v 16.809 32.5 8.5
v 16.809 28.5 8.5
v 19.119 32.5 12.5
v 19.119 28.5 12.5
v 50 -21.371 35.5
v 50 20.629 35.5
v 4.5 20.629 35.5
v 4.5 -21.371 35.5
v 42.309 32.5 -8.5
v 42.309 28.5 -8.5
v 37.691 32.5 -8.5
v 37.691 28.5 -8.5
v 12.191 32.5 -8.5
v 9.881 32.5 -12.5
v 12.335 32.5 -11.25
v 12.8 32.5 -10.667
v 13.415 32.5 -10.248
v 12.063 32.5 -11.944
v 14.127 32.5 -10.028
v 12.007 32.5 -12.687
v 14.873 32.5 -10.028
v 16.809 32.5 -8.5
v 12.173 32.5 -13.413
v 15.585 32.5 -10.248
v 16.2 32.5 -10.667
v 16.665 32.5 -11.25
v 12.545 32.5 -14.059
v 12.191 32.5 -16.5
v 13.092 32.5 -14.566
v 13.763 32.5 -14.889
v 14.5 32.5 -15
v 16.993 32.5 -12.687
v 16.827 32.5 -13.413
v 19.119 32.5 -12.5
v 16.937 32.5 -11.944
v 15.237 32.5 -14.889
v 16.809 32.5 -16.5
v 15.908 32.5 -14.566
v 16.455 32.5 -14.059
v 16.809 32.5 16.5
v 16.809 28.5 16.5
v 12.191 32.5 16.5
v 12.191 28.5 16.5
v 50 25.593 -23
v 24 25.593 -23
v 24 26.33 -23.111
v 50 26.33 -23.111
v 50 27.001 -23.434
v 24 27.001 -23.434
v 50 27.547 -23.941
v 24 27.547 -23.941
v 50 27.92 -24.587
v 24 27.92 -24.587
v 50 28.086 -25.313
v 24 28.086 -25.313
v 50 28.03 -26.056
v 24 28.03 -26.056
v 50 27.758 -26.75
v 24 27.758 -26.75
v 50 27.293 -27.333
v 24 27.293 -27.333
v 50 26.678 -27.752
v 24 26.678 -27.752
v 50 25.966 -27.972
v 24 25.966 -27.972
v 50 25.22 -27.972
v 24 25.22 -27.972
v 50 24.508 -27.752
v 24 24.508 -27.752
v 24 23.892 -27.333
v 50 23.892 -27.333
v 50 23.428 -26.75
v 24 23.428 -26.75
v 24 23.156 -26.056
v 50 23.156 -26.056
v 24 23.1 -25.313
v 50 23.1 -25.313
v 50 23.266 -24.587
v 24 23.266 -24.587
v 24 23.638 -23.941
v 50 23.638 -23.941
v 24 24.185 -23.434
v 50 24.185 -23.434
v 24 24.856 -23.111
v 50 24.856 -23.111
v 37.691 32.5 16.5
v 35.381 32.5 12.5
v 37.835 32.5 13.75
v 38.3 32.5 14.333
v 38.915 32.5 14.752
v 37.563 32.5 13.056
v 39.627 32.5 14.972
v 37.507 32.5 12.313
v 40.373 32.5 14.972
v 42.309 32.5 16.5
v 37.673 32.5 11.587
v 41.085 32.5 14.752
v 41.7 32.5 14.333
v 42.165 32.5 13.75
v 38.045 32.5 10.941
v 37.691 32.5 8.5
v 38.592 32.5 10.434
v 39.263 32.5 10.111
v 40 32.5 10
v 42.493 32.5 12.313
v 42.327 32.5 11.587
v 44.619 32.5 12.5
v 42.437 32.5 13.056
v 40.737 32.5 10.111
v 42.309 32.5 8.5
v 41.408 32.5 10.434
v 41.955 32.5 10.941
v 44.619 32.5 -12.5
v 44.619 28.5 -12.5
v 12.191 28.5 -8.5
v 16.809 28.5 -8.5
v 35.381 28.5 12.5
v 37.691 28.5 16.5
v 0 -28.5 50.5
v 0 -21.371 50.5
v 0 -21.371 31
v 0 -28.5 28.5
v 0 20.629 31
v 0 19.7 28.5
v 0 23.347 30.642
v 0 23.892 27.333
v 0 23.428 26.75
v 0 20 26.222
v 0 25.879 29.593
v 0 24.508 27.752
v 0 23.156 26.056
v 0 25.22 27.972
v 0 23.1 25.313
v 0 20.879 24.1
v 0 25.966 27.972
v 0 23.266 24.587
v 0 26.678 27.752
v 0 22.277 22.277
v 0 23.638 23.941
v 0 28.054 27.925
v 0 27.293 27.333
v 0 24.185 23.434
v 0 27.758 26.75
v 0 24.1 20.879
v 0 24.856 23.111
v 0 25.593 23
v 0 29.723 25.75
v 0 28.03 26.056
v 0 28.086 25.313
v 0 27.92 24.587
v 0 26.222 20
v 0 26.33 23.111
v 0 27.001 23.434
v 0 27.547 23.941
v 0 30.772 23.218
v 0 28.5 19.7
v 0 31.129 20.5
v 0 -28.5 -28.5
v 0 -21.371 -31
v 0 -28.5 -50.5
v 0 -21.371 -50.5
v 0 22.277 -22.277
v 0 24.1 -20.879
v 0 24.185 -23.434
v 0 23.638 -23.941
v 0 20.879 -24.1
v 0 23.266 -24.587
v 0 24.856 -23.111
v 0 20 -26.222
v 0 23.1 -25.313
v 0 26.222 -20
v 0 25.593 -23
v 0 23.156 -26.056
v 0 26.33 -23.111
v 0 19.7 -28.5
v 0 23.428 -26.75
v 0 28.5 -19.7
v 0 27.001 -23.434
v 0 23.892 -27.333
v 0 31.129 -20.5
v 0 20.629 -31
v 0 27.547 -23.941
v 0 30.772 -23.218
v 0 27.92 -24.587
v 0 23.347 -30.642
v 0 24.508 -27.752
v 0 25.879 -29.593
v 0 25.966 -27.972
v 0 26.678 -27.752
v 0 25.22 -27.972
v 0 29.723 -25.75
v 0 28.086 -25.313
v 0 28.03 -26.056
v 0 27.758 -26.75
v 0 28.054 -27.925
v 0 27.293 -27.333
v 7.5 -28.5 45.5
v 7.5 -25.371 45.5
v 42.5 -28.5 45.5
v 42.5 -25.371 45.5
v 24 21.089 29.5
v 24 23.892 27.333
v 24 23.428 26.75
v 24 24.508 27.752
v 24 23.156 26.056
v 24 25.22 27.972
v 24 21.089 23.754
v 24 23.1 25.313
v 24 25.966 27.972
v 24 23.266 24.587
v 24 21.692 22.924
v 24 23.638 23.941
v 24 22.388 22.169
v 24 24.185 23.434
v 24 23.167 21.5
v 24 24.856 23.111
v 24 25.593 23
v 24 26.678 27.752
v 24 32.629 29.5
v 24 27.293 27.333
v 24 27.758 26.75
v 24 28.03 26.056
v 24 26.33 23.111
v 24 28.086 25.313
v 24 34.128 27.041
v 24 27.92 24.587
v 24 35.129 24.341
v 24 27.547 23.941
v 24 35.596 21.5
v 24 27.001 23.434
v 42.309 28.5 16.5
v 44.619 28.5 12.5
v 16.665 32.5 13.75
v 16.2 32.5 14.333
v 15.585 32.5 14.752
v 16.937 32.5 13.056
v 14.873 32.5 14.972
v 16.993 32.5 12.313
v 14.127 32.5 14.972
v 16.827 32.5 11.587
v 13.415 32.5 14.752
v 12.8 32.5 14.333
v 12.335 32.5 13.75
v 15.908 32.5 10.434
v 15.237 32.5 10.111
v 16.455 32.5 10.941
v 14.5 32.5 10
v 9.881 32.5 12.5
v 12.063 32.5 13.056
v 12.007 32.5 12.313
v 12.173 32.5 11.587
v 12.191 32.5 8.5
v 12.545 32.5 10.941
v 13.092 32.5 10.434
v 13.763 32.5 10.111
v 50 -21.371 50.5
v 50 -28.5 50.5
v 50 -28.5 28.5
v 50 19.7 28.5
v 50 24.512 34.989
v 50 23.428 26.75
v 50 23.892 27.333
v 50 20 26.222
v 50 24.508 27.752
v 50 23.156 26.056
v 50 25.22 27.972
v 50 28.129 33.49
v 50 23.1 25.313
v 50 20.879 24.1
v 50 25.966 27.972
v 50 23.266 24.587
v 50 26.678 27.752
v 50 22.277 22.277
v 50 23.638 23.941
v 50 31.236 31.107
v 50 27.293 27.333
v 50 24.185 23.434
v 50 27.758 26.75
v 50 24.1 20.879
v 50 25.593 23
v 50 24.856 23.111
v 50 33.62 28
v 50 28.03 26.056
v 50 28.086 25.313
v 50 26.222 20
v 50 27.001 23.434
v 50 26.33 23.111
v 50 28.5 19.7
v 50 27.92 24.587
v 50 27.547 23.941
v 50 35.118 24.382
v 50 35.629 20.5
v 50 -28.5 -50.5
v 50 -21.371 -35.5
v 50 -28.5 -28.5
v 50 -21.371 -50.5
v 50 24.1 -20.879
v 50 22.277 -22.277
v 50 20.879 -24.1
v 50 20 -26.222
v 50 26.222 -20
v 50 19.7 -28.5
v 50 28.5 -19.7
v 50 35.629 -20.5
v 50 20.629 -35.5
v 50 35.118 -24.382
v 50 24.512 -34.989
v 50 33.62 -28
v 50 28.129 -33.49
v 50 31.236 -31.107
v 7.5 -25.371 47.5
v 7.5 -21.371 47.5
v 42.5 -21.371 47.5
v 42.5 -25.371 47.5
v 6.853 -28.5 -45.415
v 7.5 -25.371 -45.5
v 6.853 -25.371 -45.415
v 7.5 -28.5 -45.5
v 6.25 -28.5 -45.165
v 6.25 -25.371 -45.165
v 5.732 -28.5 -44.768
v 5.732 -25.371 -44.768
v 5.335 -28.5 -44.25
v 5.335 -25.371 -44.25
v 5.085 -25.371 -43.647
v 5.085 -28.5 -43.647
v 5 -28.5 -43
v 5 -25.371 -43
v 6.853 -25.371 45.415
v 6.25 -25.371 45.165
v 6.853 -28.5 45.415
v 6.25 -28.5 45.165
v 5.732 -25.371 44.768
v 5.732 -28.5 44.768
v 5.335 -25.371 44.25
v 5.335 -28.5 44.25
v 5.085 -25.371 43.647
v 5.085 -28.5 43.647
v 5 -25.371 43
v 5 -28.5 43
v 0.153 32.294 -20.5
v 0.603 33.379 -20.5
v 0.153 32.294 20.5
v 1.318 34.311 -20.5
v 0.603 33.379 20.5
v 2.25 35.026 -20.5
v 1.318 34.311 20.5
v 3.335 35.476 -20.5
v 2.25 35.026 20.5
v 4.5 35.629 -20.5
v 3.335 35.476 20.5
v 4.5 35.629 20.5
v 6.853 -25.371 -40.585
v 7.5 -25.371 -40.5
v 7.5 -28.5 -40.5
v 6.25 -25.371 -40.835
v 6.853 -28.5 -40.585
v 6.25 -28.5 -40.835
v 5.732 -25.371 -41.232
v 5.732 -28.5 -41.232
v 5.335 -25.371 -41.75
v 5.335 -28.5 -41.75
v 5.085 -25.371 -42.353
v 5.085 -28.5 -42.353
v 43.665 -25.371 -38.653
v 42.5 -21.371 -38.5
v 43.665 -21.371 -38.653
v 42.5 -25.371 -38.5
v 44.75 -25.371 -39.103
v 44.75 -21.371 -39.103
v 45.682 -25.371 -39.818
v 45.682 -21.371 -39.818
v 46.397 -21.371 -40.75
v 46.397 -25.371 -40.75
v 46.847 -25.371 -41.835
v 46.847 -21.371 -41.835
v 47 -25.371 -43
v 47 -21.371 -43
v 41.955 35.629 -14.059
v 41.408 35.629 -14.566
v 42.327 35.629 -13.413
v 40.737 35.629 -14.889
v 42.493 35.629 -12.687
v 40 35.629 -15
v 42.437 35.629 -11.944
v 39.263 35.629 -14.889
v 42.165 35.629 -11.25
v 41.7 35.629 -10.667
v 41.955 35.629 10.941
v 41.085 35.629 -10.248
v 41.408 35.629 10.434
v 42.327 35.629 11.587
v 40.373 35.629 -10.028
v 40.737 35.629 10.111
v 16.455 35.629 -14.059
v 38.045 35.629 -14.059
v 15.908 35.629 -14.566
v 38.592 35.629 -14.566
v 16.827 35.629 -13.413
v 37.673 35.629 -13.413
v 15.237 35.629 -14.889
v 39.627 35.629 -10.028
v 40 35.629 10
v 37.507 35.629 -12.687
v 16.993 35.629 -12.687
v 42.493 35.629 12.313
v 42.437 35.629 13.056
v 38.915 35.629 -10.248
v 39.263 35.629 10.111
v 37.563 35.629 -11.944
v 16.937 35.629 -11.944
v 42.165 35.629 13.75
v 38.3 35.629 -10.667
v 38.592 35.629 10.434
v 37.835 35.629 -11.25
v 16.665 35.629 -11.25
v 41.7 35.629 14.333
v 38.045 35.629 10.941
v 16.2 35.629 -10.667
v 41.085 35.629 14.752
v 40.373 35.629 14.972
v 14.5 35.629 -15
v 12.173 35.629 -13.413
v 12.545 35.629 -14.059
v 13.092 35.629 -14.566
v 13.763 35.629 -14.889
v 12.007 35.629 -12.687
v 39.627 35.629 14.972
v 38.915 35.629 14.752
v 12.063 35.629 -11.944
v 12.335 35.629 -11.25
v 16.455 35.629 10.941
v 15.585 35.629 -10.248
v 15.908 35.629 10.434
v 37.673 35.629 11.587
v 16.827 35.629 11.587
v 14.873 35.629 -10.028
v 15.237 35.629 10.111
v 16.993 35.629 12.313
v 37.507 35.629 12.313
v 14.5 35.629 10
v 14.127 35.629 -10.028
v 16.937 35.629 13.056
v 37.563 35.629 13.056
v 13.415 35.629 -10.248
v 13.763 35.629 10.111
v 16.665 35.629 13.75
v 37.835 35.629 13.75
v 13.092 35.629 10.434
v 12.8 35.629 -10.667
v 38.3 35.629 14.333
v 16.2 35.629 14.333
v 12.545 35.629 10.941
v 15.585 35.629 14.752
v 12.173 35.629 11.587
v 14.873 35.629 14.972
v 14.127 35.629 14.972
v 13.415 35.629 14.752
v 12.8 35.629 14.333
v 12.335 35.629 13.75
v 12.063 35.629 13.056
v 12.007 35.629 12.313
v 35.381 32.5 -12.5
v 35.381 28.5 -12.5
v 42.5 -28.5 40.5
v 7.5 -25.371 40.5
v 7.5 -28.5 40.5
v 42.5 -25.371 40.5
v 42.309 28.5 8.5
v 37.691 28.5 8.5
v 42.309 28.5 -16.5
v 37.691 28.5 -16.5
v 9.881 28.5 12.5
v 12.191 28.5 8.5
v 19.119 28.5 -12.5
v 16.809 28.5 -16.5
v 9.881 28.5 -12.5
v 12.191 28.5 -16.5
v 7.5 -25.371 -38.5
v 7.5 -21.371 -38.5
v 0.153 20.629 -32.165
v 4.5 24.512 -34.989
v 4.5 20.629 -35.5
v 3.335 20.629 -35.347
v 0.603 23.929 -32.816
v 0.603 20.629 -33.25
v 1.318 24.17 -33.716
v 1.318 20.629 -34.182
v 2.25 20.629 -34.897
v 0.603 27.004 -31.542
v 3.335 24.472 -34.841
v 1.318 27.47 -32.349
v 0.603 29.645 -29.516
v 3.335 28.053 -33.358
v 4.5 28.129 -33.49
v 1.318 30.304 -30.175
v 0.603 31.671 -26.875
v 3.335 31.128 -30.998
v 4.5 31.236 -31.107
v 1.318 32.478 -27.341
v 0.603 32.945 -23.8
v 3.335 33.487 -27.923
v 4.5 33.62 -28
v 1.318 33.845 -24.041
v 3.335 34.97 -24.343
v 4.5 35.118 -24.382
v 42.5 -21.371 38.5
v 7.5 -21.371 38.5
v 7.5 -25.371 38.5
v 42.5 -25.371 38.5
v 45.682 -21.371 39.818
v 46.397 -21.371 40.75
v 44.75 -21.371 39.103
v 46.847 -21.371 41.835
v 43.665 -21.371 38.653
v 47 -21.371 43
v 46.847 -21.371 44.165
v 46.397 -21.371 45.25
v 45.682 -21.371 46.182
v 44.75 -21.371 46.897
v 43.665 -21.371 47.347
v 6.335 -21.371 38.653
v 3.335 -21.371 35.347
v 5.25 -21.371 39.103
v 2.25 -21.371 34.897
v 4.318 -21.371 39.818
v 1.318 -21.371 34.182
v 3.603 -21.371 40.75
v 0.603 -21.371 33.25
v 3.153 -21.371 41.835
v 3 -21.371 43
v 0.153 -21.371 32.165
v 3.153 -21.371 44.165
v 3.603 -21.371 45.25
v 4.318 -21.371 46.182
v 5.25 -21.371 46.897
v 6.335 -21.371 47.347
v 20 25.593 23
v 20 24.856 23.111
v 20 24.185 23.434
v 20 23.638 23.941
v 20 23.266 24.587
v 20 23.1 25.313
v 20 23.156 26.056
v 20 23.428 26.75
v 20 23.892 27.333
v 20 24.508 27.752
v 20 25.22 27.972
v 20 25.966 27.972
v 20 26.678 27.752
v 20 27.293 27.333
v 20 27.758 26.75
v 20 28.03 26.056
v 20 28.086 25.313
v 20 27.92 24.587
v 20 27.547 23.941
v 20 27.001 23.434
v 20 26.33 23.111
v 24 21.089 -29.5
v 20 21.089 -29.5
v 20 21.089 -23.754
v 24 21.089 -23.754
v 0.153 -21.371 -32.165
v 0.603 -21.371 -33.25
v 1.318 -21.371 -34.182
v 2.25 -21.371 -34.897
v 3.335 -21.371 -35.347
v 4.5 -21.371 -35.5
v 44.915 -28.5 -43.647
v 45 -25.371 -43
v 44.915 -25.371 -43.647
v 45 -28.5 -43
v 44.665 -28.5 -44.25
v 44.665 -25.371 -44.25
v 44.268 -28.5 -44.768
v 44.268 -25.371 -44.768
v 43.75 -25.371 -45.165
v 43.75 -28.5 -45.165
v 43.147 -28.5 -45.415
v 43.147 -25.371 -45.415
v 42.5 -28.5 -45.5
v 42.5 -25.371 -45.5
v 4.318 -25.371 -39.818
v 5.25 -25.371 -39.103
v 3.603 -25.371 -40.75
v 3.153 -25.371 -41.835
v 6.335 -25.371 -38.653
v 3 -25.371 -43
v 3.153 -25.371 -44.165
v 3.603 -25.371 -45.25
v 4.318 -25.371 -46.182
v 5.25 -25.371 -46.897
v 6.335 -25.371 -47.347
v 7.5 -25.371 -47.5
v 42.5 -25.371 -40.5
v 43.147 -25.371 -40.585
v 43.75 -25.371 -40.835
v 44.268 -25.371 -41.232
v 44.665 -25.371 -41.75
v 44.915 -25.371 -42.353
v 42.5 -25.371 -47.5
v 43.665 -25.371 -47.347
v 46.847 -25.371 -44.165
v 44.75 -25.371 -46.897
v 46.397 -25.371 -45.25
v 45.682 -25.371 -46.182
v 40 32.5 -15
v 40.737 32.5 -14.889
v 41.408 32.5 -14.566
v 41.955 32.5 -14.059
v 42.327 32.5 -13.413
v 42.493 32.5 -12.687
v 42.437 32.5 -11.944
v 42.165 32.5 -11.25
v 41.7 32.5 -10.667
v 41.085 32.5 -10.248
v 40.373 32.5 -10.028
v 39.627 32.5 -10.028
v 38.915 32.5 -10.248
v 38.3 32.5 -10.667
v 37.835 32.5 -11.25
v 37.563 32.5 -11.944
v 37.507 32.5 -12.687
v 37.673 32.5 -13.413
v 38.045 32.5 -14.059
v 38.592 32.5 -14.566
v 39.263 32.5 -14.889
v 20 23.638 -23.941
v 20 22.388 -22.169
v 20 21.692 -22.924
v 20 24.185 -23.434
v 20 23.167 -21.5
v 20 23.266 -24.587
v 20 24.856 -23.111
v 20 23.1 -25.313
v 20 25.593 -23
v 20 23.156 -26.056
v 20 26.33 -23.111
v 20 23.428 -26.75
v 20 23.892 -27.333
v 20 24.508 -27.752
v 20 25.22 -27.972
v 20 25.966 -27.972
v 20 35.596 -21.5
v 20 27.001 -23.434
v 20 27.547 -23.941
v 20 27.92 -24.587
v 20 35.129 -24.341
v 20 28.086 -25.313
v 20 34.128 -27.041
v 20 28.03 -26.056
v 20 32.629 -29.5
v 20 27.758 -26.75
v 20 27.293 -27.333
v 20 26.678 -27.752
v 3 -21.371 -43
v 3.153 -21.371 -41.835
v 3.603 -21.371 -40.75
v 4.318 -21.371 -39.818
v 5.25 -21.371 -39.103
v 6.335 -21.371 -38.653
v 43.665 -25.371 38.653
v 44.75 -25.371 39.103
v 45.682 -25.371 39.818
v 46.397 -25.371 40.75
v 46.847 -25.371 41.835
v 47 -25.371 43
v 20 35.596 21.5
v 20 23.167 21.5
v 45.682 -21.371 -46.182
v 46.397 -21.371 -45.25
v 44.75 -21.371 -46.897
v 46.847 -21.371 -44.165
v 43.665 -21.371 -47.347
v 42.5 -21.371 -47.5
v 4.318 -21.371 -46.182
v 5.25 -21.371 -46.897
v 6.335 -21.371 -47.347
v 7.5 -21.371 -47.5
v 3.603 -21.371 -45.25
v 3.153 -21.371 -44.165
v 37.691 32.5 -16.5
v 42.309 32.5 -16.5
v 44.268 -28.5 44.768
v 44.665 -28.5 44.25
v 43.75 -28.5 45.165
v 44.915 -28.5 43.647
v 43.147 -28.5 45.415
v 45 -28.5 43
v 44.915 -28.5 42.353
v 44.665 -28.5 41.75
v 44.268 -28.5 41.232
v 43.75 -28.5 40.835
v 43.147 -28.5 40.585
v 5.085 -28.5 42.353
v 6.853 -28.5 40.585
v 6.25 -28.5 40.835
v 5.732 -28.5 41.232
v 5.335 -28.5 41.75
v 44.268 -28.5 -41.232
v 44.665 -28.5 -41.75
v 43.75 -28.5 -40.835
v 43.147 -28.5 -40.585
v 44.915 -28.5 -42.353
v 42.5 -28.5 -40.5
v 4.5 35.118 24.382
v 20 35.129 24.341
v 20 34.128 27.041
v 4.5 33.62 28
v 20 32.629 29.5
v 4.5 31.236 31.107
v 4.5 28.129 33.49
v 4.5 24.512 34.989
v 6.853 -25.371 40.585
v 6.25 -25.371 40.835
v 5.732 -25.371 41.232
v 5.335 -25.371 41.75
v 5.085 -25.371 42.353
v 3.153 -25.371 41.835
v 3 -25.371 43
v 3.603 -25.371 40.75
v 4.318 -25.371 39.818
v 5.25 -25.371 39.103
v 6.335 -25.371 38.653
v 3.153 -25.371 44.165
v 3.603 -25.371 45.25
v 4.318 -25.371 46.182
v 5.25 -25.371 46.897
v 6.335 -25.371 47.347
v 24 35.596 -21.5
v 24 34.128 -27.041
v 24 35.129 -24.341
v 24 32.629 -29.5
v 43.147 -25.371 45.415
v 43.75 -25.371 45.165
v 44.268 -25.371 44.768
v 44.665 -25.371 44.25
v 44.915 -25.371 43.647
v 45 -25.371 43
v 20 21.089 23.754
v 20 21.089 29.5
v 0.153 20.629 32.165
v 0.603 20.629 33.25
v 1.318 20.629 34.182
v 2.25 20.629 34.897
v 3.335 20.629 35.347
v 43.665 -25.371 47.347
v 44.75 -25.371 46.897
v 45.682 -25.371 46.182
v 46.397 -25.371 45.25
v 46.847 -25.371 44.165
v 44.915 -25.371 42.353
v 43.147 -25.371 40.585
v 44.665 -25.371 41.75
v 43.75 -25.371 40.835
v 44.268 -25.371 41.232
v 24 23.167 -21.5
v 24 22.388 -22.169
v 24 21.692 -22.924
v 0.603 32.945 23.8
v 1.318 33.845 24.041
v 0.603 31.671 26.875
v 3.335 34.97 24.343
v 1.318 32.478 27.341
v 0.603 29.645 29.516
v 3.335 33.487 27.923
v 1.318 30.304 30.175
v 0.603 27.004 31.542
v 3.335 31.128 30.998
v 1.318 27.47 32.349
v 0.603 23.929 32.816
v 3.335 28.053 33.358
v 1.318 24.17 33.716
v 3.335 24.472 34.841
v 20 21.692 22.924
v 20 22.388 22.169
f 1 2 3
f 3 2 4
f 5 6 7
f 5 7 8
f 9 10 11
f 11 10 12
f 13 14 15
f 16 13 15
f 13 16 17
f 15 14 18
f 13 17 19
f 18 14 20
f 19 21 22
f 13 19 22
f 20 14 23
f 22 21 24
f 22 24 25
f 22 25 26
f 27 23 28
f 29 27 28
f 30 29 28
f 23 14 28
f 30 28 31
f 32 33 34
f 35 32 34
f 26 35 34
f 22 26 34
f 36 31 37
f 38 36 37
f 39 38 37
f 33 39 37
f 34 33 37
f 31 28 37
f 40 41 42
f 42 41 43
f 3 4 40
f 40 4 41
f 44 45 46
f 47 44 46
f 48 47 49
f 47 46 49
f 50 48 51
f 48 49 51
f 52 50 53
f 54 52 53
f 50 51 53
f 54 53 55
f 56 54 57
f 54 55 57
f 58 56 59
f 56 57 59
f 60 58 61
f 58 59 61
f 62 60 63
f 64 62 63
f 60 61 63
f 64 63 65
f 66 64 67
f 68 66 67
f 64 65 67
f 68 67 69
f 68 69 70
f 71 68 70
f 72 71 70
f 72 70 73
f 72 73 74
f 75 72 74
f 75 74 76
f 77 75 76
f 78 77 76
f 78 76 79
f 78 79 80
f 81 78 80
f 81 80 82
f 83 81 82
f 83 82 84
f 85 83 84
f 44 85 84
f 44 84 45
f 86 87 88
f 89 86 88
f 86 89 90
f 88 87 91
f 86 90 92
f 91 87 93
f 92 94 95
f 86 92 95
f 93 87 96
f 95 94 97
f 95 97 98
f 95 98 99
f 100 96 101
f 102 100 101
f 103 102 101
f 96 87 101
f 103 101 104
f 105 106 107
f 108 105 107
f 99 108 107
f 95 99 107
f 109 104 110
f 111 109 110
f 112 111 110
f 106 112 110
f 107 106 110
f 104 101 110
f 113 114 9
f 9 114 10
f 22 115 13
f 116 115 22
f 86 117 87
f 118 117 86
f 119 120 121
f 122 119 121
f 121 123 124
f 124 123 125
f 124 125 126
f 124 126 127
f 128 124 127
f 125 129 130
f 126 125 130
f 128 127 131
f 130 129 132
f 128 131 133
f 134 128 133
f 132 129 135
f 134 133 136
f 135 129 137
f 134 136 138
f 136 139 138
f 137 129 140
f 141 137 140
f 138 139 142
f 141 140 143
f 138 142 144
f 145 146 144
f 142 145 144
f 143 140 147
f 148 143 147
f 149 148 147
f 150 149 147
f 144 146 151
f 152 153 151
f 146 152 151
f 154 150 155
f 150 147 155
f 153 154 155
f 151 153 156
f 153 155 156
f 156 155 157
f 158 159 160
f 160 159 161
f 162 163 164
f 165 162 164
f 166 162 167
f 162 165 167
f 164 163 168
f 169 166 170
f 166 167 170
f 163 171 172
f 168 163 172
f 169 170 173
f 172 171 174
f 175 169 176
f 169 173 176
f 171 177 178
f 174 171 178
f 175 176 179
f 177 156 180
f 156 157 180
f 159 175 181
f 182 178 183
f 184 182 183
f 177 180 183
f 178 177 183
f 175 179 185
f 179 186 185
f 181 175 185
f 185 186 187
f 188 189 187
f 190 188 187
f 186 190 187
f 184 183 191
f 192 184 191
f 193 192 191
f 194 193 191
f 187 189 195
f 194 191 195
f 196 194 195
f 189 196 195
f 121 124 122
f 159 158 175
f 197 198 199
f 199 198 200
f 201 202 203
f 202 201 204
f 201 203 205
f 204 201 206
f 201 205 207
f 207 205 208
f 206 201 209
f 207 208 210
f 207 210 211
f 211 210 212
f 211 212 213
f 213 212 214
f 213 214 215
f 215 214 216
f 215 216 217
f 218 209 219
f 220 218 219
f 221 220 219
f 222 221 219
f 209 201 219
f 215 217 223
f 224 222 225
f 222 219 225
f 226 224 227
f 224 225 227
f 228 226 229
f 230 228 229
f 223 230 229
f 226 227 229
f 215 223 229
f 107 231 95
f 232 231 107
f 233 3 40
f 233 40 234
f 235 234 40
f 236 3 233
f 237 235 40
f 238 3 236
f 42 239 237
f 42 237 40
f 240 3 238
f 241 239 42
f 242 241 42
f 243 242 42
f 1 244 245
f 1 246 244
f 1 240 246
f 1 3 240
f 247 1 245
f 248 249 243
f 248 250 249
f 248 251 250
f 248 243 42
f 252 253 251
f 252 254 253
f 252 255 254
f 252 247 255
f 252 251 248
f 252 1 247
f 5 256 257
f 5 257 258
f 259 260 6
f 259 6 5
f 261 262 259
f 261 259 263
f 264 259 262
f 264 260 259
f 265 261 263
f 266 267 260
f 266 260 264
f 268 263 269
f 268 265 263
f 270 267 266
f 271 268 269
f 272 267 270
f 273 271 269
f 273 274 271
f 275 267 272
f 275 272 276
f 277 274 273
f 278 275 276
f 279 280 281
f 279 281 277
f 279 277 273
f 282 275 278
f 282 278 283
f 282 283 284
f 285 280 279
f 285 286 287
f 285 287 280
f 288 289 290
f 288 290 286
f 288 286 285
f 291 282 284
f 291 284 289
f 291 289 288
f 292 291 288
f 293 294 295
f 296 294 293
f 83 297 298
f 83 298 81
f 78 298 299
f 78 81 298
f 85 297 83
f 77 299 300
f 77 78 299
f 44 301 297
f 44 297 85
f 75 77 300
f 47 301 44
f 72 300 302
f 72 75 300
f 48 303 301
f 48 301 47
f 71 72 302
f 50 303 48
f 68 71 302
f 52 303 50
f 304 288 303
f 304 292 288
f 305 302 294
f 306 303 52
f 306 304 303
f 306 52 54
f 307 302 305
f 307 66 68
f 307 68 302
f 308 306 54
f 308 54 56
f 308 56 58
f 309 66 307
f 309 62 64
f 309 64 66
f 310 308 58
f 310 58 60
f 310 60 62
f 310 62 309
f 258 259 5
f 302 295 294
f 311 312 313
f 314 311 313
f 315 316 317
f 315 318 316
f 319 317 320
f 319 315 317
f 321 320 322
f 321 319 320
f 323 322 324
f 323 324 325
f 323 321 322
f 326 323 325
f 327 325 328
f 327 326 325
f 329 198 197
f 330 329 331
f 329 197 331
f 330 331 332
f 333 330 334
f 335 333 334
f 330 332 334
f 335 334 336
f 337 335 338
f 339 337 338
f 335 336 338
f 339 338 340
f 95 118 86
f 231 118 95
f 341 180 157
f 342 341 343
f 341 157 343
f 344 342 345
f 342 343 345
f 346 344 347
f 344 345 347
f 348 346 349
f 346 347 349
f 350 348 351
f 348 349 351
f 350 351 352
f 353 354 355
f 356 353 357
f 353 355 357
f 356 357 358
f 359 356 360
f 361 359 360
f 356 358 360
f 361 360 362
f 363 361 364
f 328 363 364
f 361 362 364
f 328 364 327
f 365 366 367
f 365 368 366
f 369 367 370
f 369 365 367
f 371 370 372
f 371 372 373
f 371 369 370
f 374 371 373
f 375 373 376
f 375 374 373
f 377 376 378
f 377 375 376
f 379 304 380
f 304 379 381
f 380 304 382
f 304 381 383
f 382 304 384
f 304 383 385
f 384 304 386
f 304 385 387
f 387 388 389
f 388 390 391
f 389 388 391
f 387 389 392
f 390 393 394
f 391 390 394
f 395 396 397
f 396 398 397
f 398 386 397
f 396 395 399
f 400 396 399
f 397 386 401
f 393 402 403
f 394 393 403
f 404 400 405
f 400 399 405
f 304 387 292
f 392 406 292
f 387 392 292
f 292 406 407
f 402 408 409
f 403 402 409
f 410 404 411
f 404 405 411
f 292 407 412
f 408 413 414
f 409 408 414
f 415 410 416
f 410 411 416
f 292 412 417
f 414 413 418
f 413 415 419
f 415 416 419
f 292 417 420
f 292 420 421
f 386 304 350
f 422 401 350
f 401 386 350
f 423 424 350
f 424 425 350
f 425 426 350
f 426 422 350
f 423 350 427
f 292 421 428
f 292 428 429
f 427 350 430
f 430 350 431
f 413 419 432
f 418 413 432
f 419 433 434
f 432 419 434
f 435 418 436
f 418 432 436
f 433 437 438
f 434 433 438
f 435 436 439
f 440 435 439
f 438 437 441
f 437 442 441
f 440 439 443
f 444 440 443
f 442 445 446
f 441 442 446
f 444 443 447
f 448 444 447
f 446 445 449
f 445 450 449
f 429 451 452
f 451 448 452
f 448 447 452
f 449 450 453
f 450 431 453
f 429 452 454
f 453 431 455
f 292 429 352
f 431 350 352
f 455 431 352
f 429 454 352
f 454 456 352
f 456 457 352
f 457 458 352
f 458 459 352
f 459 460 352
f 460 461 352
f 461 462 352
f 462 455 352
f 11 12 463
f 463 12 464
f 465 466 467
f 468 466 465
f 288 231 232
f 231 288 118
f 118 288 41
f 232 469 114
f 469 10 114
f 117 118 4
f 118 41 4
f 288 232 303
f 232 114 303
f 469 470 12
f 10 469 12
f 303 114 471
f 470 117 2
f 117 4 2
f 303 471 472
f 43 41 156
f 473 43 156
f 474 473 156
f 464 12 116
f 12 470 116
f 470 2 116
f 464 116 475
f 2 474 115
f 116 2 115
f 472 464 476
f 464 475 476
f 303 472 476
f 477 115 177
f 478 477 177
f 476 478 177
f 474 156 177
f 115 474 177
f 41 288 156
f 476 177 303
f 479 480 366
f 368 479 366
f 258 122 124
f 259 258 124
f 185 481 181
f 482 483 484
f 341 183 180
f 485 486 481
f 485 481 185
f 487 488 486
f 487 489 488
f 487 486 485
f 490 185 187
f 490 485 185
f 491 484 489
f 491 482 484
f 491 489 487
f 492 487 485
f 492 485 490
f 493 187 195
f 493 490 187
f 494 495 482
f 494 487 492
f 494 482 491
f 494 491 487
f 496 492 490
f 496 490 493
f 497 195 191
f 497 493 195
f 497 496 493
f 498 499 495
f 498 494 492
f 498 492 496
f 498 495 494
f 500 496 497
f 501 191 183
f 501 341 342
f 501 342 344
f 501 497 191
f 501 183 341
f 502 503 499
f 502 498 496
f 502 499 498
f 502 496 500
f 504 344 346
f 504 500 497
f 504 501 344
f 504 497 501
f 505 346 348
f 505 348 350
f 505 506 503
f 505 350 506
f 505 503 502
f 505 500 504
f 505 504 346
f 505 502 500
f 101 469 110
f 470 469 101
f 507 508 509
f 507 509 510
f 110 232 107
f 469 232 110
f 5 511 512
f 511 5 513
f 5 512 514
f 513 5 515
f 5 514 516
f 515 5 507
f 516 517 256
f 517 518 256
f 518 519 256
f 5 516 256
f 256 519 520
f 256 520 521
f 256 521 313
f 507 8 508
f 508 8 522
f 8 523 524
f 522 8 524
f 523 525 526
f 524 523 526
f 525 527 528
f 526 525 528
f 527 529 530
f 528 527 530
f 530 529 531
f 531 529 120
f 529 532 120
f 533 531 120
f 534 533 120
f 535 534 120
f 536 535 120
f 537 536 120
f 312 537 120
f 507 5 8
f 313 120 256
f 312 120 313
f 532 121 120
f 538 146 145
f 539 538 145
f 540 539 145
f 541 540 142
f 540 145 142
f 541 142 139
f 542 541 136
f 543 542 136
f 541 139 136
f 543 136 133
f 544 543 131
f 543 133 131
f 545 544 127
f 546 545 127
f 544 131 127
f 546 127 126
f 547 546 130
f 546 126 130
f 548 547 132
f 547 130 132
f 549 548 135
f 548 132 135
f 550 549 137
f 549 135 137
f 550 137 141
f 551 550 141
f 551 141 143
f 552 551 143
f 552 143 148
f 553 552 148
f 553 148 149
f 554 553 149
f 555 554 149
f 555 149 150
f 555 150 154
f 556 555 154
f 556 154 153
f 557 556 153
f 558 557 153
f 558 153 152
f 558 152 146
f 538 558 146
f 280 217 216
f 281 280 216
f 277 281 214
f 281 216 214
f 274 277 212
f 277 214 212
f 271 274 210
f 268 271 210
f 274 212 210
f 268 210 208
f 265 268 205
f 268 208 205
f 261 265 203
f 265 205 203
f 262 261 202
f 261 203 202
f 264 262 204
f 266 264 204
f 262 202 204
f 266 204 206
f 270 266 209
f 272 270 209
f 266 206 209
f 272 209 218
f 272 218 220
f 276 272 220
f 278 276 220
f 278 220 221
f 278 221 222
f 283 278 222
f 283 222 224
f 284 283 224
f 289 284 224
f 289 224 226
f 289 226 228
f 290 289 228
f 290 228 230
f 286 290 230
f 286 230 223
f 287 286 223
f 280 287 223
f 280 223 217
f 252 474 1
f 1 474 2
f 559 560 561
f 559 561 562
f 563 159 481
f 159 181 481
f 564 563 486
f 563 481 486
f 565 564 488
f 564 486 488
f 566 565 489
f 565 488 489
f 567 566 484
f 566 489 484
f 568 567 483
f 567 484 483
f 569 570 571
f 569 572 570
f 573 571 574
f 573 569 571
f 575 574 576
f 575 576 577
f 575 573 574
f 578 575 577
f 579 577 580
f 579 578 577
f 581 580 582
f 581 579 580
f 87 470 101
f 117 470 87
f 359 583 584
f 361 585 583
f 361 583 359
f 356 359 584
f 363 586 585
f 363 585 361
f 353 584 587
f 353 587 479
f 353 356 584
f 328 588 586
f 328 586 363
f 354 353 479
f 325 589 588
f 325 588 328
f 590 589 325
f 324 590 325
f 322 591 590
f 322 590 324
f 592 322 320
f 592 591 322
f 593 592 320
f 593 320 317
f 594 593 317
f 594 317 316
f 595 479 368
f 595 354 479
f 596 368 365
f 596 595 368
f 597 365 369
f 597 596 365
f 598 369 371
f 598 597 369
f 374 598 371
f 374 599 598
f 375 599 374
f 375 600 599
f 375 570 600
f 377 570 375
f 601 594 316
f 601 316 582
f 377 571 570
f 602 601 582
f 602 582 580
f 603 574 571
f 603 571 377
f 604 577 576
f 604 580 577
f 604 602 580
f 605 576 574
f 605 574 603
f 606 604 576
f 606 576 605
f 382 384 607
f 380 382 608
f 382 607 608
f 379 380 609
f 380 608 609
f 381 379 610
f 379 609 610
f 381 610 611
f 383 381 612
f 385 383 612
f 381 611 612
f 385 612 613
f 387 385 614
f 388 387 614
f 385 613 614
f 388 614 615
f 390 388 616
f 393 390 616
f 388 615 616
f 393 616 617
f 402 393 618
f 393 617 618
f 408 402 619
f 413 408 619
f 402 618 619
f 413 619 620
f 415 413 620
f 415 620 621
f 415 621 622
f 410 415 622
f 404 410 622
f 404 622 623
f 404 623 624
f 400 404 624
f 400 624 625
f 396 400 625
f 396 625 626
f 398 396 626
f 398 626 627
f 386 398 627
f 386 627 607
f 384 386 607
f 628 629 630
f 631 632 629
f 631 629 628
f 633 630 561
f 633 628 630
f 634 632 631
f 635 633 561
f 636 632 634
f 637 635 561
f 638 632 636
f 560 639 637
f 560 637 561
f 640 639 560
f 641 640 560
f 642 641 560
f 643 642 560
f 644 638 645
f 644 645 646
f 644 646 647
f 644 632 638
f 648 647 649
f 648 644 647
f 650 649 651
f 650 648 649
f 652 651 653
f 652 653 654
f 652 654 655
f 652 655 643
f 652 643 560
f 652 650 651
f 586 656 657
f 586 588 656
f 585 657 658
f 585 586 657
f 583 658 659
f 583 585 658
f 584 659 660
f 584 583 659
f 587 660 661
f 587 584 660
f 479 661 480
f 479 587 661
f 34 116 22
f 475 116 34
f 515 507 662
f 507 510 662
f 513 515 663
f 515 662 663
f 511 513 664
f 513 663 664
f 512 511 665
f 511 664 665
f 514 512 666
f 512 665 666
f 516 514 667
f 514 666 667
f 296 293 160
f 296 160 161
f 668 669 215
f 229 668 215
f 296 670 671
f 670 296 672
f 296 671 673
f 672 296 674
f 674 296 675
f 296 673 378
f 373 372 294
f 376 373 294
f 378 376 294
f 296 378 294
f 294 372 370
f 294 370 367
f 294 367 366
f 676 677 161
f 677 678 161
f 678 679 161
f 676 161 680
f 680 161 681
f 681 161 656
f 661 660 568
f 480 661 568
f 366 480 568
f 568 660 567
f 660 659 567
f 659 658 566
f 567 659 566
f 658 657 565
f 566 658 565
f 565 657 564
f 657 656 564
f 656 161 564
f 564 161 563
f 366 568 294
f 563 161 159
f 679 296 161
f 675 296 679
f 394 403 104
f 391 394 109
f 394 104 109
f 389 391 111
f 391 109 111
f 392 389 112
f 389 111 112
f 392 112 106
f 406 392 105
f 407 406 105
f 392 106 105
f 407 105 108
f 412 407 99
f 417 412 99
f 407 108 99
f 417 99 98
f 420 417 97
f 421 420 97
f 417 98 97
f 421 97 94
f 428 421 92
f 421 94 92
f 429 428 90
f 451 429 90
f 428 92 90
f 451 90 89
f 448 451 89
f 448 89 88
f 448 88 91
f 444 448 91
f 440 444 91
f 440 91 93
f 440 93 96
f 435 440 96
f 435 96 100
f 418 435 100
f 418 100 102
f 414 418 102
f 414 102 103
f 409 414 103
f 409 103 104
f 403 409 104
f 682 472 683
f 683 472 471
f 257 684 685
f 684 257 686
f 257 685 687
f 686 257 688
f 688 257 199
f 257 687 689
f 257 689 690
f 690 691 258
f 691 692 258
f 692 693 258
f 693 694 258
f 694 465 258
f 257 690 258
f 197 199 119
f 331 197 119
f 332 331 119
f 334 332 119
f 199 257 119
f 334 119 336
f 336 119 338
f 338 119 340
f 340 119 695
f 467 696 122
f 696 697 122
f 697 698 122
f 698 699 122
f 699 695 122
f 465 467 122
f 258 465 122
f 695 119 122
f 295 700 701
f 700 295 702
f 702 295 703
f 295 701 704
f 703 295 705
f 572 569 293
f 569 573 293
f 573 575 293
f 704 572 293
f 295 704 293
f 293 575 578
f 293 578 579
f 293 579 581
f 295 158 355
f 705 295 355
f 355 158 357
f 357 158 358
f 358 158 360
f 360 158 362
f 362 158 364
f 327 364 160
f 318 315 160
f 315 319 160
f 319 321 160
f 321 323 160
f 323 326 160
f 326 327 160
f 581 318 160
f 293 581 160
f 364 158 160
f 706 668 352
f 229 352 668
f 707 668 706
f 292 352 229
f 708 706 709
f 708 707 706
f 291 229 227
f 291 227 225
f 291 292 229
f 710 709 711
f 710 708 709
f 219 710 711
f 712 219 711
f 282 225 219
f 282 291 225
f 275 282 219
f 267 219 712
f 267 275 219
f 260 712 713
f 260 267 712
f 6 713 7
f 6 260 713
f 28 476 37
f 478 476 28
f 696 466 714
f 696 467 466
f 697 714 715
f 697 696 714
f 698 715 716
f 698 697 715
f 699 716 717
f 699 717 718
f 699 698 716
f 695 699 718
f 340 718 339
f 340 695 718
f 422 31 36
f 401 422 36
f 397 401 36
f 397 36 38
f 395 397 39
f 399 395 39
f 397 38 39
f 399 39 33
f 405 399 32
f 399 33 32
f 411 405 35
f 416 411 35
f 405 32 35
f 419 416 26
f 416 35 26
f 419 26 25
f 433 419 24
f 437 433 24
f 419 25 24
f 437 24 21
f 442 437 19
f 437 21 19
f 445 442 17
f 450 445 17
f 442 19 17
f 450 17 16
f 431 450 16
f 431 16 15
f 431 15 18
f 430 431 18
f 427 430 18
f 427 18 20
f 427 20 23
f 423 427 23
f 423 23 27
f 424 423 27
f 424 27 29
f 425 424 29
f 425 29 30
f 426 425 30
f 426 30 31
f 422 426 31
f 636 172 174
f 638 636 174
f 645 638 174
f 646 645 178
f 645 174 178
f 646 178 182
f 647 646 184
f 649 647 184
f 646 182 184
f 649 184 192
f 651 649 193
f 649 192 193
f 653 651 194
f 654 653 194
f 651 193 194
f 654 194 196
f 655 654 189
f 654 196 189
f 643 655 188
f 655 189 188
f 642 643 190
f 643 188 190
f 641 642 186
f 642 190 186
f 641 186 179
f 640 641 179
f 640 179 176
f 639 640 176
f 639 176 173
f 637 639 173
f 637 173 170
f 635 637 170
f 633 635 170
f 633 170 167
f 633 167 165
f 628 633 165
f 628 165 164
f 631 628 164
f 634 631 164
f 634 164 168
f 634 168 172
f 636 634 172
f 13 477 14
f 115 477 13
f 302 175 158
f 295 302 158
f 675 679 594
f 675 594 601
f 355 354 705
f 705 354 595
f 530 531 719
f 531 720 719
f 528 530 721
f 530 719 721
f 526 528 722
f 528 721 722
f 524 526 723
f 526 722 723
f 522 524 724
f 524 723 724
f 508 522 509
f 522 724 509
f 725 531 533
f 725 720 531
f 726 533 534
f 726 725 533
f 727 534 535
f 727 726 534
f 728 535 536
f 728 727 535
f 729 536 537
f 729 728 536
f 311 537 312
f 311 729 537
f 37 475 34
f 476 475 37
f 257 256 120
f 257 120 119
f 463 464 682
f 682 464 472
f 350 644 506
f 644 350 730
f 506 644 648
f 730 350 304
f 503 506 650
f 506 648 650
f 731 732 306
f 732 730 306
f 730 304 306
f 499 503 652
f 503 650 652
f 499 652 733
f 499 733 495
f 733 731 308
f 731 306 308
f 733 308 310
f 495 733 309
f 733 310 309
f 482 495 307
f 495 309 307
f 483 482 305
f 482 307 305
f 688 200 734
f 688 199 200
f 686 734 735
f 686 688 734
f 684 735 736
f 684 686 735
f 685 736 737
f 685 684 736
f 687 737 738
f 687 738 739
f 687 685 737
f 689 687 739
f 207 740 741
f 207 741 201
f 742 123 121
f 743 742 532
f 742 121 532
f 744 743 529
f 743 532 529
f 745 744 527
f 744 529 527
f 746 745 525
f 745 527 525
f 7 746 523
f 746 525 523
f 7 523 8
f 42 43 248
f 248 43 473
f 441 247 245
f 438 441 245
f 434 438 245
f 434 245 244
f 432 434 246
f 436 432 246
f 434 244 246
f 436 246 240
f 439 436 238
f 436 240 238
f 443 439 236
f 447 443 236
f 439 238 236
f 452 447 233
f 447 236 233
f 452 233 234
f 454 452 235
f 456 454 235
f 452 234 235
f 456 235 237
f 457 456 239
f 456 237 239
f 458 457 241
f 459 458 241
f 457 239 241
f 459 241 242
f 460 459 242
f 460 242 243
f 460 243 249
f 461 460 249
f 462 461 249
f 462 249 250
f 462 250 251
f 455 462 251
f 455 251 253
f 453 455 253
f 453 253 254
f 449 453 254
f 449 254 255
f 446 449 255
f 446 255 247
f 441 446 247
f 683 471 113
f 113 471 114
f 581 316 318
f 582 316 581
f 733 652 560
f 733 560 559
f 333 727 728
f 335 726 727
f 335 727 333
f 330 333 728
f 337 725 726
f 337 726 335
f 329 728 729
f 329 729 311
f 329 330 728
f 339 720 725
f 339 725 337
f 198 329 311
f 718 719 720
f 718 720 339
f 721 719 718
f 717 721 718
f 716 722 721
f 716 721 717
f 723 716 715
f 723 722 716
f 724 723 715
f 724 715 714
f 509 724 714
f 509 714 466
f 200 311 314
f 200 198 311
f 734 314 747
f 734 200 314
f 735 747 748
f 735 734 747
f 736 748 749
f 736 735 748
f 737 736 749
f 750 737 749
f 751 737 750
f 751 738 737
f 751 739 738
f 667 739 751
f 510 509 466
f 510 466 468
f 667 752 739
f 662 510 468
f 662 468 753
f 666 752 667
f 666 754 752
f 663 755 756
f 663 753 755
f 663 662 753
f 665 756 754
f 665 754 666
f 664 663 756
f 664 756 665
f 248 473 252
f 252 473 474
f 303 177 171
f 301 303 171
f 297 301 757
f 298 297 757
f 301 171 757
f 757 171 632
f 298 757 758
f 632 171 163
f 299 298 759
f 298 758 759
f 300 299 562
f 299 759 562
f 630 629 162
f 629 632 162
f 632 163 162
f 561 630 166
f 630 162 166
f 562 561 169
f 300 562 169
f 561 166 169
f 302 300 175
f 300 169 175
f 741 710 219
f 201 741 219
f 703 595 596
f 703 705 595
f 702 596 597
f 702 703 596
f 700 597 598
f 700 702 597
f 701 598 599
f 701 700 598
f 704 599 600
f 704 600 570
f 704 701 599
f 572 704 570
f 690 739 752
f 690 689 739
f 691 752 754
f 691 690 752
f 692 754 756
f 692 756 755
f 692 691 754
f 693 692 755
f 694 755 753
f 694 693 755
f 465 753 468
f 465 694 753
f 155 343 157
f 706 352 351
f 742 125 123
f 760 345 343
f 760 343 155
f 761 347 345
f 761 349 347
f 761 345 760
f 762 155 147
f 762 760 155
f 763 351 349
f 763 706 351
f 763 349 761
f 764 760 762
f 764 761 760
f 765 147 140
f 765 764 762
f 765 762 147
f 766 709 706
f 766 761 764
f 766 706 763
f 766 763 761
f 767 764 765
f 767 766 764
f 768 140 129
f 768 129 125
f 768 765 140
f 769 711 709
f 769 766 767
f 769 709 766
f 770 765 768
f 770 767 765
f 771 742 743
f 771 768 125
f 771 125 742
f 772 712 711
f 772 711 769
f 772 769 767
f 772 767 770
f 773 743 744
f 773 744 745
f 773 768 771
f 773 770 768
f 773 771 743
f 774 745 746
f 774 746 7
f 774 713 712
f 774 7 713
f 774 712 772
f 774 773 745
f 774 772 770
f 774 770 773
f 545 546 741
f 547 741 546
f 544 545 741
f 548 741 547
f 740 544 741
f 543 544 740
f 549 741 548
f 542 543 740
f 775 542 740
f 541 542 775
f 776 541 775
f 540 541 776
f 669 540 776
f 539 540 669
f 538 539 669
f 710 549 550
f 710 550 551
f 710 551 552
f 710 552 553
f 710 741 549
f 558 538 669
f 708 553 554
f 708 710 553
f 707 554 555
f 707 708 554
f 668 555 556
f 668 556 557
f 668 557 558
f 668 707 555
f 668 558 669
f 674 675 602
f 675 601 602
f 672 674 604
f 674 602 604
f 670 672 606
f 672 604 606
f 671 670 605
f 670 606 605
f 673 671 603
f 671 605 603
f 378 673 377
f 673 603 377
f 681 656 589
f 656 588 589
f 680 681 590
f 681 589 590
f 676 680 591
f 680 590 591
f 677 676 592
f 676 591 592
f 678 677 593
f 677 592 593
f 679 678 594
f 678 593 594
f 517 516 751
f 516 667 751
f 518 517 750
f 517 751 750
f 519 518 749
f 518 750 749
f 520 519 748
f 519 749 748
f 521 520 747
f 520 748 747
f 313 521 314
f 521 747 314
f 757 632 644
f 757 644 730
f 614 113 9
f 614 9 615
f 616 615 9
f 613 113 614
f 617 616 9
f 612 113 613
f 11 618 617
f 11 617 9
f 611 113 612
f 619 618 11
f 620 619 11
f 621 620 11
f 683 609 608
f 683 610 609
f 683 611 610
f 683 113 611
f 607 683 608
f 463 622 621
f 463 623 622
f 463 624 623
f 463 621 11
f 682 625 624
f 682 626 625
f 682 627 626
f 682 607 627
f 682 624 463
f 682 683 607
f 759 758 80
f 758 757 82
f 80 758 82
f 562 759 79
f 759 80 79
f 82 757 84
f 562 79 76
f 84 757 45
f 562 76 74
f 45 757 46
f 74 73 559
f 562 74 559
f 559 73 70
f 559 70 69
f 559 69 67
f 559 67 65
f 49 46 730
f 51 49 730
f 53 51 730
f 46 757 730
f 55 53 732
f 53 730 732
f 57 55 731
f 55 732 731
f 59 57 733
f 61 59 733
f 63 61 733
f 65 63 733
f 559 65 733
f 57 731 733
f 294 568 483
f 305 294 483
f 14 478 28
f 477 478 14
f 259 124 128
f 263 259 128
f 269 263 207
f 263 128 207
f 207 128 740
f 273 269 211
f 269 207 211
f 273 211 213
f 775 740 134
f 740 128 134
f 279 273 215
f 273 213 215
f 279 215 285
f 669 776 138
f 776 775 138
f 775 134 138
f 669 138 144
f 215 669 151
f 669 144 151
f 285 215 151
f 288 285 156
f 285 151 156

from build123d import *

# Parameters (mm, degrees)
BOSS_EXTRUDE1_DEPTH = 50
SKETCH2_R           = 2.5
CUT_EXTRUDE1_DEPTH  = 50
FILLET1_R           = 15
SKETCH3_W           = 4
SKETCH3_H           = 8
CUT_EXTRUDE2_DEPTH  = 14.54
SKETCH4_W           = 44
SKETCH4_H           = 9
CUT_EXTRUDE3_DEPTH  = 4
SKETCH5_W           = 40
SKETCH5_H           = 5
CUT_EXTRUDE4_DEPTH  = 94.654951818
FILLET2_R           = 2.5
FILLET3_R           = 4.5
FILLET4_R           = 4.5
CUT_EXTRUDE5_START  = -7.129335
SKETCH6_R           = 2.5
CUT_EXTRUDE5_DEPTH  = 4
SKETCH8_R           = 2.5
CUT_EXTRUDE6_DEPTH  = 92.100219539


with BuildPart() as part:
    # Sketch1 → Boss-Extrude1 (new body)
    with BuildSketch(Plane(origin=(0, 0, 0), x_dir=(0, 0, -1), z_dir=(1, 0, 0))):
        with BuildLine():
            Line((35.5, 35.62933491), (-35.5, 35.62933491))
            Line((-35.5, 35.62933491), (-35.5, -21.37066509))
            Line((-35.5, -21.37066509), (-50.5, -21.37066509))
            Line((-50.5, -21.37066509), (-50.5, -28.5))
            Line((-50.5, -28.5), (-28.5, -28.5))
            Line((-28.5, -28.5), (-28.5, 19.7))
            ThreePointArc((-28.5, 19.7), (-22.277460326, 22.277460326), (-19.7, 28.5))
            Line((-19.7, 28.5), (19.7, 28.5))
            ThreePointArc((19.7, 28.5), (22.277460326, 22.277460326), (28.5, 19.7))
            Line((28.5, 19.7), (28.5, -28.5))
            Line((28.5, -28.5), (50.5, -28.5))
            Line((50.5, -28.5), (50.5, -21.37066509))
            Line((50.5, -21.37066509), (35.5, -21.37066509))
            Line((35.5, -21.37066509), (35.5, 35.62933491))
        make_face()
    extrude(amount=BOSS_EXTRUDE1_DEPTH)

    # Sketch2 → Cut-Extrude1 (cut)
    with BuildSketch(Plane.ZY):
        with Locations((-25.5, 25.592902541)):
            Circle(SKETCH2_R)
        with Locations(Location((25.5, 25.592902541, 0), (0, 0, 180))):
            Circle(SKETCH2_R)
    extrude(amount=-CUT_EXTRUDE1_DEPTH, mode=Mode.SUBTRACT)

    # Fillet1
    fillet1_edges = [part.edges().sort_by_distance(p)[0] for p in [
        (25, 35.62933491, 35.5),
        (25, 35.62933491, -35.5),
    ]]
    fillet(fillet1_edges, radius=FILLET1_R)

    # Sketch3 → Cut-Extrude2 (cut)
    with BuildSketch(Plane(origin=(0, 35.62933491, 0), x_dir=(1, 0, 0), z_dir=(0, 1, 0))):
        with Locations((22, 25.5)):
            Rectangle(SKETCH3_W, SKETCH3_H)
        with Locations((22, -25.5)):
            Rectangle(SKETCH3_W, SKETCH3_H)
    extrude(amount=-CUT_EXTRUDE2_DEPTH, mode=Mode.SUBTRACT)

    # Sketch4 → Cut-Extrude3 (cut)
    with BuildSketch(Plane(origin=(0, -21.37066509, 0), x_dir=(1, 0, 0), z_dir=(0, 1, 0))):
        with Locations((25, -43)):
            Rectangle(SKETCH4_W, SKETCH4_H)
        with Locations((25, 43)):
            Rectangle(SKETCH4_W, SKETCH4_H)
    extrude(amount=-CUT_EXTRUDE3_DEPTH, mode=Mode.SUBTRACT)

    # Sketch5 → Cut-Extrude4 (cut, through all)
    with BuildSketch(Plane(origin=(0, -25.37066509, 0), x_dir=(1, 0, 0), z_dir=(0, 1, 0))):
        with Locations((25, -43)):
            Rectangle(SKETCH5_W, SKETCH5_H)
        with Locations((25, 43)):
            Rectangle(SKETCH5_W, SKETCH5_H)
    extrude(amount=-CUT_EXTRUDE4_DEPTH, mode=Mode.SUBTRACT)

    # Fillet2
    fillet2_edges = [part.edges().sort_by_distance(p)[0] for p in [
        (45, -26.935332545, 40.5),
        (45, -26.935332545, 45.5),
        (5, -26.935332545, 45.5),
        (5, -26.935332545, 40.5),
        (5, -26.935332545, -45.5),
        (5, -26.935332545, -40.5),
        (45, -26.935332545, -45.5),
        (45, -26.935332545, -40.5),
    ]]
    fillet(fillet2_edges, radius=FILLET2_R - 0.0001)  # a hair under: the kernel refuses the full size

    # Fillet3
    fillet3_edges = [part.edges().sort_by_distance(p)[0] for p in [
        (3, -23.37066509, 38.5),
        (3, -23.37066509, 47.5),
        (47, -23.37066509, 47.5),
        (47, -23.37066509, 38.5),
        (47, -23.37066509, -47.5),
        (47, -23.37066509, -38.5),
        (3, -23.37066509, -47.5),
        (3, -23.37066509, -38.5),
    ]]
    fillet(fillet3_edges, radius=FILLET3_R - 0.0001)  # a hair under: the kernel refuses the full size

    # Fillet4
    fillet4_edges = [part.edges().sort_by_distance(p)[0] for p in [
        (0, -0.37066509, -35.5),
        (0, -0.37066509, 35.5),
        (0, 35.62933491, 0),
        (0, 31.235936628, -31.106601718),
        (0, 31.235936628, 31.106601718),
    ]]
    fillet(fillet4_edges, radius=FILLET4_R)

    # Sketch6 → Cut-Extrude5 (cut)
    # profile 1 of 4: a face of its own
    with BuildSketch(Plane(origin=(0, 35.62933491, 0), x_dir=(1, 0, 0), z_dir=(0, 1, 0)).offset(CUT_EXTRUDE5_START)):
        Polygon((16.809401077, -8.5), (19.118802154, -12.5), (16.809401077, -16.5), (12.190598923, -16.5), (9.881197846, -12.5), (12.190598923, -8.5), align=None)
        with Locations(Location((14.5, -12.5, 0), (0, 0, 270))):
            Circle(SKETCH6_R, mode=Mode.SUBTRACT)
    # profile 2 of 4: a face of its own
    with BuildSketch(Plane(origin=(0, 35.62933491, 0), x_dir=(1, 0, 0), z_dir=(0, 1, 0)).offset(CUT_EXTRUDE5_START)):
        Polygon((19.118802154, 12.5), (16.809401077, 16.5), (12.190598923, 16.5), (9.881197846, 12.5), (12.190598923, 8.5), (16.809401077, 8.5), align=None)
        with Locations(Location((14.5, 12.5, 0), (0, 0, 270))):
            Circle(SKETCH6_R, mode=Mode.SUBTRACT)
    # profile 3 of 4: a face of its own
    with BuildSketch(Plane(origin=(0, 35.62933491, 0), x_dir=(1, 0, 0), z_dir=(0, 1, 0)).offset(CUT_EXTRUDE5_START)):
        Polygon((42.309401077, -8.5), (37.690598923, -8.5), (35.381197846, -12.5), (37.690598923, -16.5), (42.309401077, -16.5), (44.618802154, -12.5), align=None)
        with Locations(Location((40, -12.5, 0), (0, 0, 270))):
            Circle(SKETCH6_R, mode=Mode.SUBTRACT)
    # profile 4 of 4: a face of its own
    with BuildSketch(Plane(origin=(0, 35.62933491, 0), x_dir=(1, 0, 0), z_dir=(0, 1, 0)).offset(CUT_EXTRUDE5_START)):
        Polygon((37.690598923, 8.5), (35.381197846, 12.5), (37.690598923, 16.5), (42.309401077, 16.5), (44.618802154, 12.5), (42.309401077, 8.5), align=None)
        with Locations(Location((40, 12.5, 0), (0, 0, 270))):
            Circle(SKETCH6_R, mode=Mode.SUBTRACT)
    extrude(amount=CUT_EXTRUDE5_DEPTH, mode=Mode.SUBTRACT)

    # Sketch8 → Cut-Extrude6 (cut, through all)
    with BuildSketch(Plane.XZ.offset(-28.5)):
        with Locations(Location((14.5, -12.5, 0), (0, 0, 270))):
            Circle(SKETCH8_R)
        with Locations(Location((40, 12.5, 0), (0, 0, 270))):
            Circle(SKETCH8_R)
        with Locations(Location((14.5, 12.5, 0), (0, 0, 270))):
            Circle(SKETCH8_R)
        with Locations(Location((40, -12.5, 0), (0, 0, 270))):
            Circle(SKETCH8_R)
    extrude(amount=-CUT_EXTRUDE6_DEPTH, mode=Mode.SUBTRACT)


solid = part.part
